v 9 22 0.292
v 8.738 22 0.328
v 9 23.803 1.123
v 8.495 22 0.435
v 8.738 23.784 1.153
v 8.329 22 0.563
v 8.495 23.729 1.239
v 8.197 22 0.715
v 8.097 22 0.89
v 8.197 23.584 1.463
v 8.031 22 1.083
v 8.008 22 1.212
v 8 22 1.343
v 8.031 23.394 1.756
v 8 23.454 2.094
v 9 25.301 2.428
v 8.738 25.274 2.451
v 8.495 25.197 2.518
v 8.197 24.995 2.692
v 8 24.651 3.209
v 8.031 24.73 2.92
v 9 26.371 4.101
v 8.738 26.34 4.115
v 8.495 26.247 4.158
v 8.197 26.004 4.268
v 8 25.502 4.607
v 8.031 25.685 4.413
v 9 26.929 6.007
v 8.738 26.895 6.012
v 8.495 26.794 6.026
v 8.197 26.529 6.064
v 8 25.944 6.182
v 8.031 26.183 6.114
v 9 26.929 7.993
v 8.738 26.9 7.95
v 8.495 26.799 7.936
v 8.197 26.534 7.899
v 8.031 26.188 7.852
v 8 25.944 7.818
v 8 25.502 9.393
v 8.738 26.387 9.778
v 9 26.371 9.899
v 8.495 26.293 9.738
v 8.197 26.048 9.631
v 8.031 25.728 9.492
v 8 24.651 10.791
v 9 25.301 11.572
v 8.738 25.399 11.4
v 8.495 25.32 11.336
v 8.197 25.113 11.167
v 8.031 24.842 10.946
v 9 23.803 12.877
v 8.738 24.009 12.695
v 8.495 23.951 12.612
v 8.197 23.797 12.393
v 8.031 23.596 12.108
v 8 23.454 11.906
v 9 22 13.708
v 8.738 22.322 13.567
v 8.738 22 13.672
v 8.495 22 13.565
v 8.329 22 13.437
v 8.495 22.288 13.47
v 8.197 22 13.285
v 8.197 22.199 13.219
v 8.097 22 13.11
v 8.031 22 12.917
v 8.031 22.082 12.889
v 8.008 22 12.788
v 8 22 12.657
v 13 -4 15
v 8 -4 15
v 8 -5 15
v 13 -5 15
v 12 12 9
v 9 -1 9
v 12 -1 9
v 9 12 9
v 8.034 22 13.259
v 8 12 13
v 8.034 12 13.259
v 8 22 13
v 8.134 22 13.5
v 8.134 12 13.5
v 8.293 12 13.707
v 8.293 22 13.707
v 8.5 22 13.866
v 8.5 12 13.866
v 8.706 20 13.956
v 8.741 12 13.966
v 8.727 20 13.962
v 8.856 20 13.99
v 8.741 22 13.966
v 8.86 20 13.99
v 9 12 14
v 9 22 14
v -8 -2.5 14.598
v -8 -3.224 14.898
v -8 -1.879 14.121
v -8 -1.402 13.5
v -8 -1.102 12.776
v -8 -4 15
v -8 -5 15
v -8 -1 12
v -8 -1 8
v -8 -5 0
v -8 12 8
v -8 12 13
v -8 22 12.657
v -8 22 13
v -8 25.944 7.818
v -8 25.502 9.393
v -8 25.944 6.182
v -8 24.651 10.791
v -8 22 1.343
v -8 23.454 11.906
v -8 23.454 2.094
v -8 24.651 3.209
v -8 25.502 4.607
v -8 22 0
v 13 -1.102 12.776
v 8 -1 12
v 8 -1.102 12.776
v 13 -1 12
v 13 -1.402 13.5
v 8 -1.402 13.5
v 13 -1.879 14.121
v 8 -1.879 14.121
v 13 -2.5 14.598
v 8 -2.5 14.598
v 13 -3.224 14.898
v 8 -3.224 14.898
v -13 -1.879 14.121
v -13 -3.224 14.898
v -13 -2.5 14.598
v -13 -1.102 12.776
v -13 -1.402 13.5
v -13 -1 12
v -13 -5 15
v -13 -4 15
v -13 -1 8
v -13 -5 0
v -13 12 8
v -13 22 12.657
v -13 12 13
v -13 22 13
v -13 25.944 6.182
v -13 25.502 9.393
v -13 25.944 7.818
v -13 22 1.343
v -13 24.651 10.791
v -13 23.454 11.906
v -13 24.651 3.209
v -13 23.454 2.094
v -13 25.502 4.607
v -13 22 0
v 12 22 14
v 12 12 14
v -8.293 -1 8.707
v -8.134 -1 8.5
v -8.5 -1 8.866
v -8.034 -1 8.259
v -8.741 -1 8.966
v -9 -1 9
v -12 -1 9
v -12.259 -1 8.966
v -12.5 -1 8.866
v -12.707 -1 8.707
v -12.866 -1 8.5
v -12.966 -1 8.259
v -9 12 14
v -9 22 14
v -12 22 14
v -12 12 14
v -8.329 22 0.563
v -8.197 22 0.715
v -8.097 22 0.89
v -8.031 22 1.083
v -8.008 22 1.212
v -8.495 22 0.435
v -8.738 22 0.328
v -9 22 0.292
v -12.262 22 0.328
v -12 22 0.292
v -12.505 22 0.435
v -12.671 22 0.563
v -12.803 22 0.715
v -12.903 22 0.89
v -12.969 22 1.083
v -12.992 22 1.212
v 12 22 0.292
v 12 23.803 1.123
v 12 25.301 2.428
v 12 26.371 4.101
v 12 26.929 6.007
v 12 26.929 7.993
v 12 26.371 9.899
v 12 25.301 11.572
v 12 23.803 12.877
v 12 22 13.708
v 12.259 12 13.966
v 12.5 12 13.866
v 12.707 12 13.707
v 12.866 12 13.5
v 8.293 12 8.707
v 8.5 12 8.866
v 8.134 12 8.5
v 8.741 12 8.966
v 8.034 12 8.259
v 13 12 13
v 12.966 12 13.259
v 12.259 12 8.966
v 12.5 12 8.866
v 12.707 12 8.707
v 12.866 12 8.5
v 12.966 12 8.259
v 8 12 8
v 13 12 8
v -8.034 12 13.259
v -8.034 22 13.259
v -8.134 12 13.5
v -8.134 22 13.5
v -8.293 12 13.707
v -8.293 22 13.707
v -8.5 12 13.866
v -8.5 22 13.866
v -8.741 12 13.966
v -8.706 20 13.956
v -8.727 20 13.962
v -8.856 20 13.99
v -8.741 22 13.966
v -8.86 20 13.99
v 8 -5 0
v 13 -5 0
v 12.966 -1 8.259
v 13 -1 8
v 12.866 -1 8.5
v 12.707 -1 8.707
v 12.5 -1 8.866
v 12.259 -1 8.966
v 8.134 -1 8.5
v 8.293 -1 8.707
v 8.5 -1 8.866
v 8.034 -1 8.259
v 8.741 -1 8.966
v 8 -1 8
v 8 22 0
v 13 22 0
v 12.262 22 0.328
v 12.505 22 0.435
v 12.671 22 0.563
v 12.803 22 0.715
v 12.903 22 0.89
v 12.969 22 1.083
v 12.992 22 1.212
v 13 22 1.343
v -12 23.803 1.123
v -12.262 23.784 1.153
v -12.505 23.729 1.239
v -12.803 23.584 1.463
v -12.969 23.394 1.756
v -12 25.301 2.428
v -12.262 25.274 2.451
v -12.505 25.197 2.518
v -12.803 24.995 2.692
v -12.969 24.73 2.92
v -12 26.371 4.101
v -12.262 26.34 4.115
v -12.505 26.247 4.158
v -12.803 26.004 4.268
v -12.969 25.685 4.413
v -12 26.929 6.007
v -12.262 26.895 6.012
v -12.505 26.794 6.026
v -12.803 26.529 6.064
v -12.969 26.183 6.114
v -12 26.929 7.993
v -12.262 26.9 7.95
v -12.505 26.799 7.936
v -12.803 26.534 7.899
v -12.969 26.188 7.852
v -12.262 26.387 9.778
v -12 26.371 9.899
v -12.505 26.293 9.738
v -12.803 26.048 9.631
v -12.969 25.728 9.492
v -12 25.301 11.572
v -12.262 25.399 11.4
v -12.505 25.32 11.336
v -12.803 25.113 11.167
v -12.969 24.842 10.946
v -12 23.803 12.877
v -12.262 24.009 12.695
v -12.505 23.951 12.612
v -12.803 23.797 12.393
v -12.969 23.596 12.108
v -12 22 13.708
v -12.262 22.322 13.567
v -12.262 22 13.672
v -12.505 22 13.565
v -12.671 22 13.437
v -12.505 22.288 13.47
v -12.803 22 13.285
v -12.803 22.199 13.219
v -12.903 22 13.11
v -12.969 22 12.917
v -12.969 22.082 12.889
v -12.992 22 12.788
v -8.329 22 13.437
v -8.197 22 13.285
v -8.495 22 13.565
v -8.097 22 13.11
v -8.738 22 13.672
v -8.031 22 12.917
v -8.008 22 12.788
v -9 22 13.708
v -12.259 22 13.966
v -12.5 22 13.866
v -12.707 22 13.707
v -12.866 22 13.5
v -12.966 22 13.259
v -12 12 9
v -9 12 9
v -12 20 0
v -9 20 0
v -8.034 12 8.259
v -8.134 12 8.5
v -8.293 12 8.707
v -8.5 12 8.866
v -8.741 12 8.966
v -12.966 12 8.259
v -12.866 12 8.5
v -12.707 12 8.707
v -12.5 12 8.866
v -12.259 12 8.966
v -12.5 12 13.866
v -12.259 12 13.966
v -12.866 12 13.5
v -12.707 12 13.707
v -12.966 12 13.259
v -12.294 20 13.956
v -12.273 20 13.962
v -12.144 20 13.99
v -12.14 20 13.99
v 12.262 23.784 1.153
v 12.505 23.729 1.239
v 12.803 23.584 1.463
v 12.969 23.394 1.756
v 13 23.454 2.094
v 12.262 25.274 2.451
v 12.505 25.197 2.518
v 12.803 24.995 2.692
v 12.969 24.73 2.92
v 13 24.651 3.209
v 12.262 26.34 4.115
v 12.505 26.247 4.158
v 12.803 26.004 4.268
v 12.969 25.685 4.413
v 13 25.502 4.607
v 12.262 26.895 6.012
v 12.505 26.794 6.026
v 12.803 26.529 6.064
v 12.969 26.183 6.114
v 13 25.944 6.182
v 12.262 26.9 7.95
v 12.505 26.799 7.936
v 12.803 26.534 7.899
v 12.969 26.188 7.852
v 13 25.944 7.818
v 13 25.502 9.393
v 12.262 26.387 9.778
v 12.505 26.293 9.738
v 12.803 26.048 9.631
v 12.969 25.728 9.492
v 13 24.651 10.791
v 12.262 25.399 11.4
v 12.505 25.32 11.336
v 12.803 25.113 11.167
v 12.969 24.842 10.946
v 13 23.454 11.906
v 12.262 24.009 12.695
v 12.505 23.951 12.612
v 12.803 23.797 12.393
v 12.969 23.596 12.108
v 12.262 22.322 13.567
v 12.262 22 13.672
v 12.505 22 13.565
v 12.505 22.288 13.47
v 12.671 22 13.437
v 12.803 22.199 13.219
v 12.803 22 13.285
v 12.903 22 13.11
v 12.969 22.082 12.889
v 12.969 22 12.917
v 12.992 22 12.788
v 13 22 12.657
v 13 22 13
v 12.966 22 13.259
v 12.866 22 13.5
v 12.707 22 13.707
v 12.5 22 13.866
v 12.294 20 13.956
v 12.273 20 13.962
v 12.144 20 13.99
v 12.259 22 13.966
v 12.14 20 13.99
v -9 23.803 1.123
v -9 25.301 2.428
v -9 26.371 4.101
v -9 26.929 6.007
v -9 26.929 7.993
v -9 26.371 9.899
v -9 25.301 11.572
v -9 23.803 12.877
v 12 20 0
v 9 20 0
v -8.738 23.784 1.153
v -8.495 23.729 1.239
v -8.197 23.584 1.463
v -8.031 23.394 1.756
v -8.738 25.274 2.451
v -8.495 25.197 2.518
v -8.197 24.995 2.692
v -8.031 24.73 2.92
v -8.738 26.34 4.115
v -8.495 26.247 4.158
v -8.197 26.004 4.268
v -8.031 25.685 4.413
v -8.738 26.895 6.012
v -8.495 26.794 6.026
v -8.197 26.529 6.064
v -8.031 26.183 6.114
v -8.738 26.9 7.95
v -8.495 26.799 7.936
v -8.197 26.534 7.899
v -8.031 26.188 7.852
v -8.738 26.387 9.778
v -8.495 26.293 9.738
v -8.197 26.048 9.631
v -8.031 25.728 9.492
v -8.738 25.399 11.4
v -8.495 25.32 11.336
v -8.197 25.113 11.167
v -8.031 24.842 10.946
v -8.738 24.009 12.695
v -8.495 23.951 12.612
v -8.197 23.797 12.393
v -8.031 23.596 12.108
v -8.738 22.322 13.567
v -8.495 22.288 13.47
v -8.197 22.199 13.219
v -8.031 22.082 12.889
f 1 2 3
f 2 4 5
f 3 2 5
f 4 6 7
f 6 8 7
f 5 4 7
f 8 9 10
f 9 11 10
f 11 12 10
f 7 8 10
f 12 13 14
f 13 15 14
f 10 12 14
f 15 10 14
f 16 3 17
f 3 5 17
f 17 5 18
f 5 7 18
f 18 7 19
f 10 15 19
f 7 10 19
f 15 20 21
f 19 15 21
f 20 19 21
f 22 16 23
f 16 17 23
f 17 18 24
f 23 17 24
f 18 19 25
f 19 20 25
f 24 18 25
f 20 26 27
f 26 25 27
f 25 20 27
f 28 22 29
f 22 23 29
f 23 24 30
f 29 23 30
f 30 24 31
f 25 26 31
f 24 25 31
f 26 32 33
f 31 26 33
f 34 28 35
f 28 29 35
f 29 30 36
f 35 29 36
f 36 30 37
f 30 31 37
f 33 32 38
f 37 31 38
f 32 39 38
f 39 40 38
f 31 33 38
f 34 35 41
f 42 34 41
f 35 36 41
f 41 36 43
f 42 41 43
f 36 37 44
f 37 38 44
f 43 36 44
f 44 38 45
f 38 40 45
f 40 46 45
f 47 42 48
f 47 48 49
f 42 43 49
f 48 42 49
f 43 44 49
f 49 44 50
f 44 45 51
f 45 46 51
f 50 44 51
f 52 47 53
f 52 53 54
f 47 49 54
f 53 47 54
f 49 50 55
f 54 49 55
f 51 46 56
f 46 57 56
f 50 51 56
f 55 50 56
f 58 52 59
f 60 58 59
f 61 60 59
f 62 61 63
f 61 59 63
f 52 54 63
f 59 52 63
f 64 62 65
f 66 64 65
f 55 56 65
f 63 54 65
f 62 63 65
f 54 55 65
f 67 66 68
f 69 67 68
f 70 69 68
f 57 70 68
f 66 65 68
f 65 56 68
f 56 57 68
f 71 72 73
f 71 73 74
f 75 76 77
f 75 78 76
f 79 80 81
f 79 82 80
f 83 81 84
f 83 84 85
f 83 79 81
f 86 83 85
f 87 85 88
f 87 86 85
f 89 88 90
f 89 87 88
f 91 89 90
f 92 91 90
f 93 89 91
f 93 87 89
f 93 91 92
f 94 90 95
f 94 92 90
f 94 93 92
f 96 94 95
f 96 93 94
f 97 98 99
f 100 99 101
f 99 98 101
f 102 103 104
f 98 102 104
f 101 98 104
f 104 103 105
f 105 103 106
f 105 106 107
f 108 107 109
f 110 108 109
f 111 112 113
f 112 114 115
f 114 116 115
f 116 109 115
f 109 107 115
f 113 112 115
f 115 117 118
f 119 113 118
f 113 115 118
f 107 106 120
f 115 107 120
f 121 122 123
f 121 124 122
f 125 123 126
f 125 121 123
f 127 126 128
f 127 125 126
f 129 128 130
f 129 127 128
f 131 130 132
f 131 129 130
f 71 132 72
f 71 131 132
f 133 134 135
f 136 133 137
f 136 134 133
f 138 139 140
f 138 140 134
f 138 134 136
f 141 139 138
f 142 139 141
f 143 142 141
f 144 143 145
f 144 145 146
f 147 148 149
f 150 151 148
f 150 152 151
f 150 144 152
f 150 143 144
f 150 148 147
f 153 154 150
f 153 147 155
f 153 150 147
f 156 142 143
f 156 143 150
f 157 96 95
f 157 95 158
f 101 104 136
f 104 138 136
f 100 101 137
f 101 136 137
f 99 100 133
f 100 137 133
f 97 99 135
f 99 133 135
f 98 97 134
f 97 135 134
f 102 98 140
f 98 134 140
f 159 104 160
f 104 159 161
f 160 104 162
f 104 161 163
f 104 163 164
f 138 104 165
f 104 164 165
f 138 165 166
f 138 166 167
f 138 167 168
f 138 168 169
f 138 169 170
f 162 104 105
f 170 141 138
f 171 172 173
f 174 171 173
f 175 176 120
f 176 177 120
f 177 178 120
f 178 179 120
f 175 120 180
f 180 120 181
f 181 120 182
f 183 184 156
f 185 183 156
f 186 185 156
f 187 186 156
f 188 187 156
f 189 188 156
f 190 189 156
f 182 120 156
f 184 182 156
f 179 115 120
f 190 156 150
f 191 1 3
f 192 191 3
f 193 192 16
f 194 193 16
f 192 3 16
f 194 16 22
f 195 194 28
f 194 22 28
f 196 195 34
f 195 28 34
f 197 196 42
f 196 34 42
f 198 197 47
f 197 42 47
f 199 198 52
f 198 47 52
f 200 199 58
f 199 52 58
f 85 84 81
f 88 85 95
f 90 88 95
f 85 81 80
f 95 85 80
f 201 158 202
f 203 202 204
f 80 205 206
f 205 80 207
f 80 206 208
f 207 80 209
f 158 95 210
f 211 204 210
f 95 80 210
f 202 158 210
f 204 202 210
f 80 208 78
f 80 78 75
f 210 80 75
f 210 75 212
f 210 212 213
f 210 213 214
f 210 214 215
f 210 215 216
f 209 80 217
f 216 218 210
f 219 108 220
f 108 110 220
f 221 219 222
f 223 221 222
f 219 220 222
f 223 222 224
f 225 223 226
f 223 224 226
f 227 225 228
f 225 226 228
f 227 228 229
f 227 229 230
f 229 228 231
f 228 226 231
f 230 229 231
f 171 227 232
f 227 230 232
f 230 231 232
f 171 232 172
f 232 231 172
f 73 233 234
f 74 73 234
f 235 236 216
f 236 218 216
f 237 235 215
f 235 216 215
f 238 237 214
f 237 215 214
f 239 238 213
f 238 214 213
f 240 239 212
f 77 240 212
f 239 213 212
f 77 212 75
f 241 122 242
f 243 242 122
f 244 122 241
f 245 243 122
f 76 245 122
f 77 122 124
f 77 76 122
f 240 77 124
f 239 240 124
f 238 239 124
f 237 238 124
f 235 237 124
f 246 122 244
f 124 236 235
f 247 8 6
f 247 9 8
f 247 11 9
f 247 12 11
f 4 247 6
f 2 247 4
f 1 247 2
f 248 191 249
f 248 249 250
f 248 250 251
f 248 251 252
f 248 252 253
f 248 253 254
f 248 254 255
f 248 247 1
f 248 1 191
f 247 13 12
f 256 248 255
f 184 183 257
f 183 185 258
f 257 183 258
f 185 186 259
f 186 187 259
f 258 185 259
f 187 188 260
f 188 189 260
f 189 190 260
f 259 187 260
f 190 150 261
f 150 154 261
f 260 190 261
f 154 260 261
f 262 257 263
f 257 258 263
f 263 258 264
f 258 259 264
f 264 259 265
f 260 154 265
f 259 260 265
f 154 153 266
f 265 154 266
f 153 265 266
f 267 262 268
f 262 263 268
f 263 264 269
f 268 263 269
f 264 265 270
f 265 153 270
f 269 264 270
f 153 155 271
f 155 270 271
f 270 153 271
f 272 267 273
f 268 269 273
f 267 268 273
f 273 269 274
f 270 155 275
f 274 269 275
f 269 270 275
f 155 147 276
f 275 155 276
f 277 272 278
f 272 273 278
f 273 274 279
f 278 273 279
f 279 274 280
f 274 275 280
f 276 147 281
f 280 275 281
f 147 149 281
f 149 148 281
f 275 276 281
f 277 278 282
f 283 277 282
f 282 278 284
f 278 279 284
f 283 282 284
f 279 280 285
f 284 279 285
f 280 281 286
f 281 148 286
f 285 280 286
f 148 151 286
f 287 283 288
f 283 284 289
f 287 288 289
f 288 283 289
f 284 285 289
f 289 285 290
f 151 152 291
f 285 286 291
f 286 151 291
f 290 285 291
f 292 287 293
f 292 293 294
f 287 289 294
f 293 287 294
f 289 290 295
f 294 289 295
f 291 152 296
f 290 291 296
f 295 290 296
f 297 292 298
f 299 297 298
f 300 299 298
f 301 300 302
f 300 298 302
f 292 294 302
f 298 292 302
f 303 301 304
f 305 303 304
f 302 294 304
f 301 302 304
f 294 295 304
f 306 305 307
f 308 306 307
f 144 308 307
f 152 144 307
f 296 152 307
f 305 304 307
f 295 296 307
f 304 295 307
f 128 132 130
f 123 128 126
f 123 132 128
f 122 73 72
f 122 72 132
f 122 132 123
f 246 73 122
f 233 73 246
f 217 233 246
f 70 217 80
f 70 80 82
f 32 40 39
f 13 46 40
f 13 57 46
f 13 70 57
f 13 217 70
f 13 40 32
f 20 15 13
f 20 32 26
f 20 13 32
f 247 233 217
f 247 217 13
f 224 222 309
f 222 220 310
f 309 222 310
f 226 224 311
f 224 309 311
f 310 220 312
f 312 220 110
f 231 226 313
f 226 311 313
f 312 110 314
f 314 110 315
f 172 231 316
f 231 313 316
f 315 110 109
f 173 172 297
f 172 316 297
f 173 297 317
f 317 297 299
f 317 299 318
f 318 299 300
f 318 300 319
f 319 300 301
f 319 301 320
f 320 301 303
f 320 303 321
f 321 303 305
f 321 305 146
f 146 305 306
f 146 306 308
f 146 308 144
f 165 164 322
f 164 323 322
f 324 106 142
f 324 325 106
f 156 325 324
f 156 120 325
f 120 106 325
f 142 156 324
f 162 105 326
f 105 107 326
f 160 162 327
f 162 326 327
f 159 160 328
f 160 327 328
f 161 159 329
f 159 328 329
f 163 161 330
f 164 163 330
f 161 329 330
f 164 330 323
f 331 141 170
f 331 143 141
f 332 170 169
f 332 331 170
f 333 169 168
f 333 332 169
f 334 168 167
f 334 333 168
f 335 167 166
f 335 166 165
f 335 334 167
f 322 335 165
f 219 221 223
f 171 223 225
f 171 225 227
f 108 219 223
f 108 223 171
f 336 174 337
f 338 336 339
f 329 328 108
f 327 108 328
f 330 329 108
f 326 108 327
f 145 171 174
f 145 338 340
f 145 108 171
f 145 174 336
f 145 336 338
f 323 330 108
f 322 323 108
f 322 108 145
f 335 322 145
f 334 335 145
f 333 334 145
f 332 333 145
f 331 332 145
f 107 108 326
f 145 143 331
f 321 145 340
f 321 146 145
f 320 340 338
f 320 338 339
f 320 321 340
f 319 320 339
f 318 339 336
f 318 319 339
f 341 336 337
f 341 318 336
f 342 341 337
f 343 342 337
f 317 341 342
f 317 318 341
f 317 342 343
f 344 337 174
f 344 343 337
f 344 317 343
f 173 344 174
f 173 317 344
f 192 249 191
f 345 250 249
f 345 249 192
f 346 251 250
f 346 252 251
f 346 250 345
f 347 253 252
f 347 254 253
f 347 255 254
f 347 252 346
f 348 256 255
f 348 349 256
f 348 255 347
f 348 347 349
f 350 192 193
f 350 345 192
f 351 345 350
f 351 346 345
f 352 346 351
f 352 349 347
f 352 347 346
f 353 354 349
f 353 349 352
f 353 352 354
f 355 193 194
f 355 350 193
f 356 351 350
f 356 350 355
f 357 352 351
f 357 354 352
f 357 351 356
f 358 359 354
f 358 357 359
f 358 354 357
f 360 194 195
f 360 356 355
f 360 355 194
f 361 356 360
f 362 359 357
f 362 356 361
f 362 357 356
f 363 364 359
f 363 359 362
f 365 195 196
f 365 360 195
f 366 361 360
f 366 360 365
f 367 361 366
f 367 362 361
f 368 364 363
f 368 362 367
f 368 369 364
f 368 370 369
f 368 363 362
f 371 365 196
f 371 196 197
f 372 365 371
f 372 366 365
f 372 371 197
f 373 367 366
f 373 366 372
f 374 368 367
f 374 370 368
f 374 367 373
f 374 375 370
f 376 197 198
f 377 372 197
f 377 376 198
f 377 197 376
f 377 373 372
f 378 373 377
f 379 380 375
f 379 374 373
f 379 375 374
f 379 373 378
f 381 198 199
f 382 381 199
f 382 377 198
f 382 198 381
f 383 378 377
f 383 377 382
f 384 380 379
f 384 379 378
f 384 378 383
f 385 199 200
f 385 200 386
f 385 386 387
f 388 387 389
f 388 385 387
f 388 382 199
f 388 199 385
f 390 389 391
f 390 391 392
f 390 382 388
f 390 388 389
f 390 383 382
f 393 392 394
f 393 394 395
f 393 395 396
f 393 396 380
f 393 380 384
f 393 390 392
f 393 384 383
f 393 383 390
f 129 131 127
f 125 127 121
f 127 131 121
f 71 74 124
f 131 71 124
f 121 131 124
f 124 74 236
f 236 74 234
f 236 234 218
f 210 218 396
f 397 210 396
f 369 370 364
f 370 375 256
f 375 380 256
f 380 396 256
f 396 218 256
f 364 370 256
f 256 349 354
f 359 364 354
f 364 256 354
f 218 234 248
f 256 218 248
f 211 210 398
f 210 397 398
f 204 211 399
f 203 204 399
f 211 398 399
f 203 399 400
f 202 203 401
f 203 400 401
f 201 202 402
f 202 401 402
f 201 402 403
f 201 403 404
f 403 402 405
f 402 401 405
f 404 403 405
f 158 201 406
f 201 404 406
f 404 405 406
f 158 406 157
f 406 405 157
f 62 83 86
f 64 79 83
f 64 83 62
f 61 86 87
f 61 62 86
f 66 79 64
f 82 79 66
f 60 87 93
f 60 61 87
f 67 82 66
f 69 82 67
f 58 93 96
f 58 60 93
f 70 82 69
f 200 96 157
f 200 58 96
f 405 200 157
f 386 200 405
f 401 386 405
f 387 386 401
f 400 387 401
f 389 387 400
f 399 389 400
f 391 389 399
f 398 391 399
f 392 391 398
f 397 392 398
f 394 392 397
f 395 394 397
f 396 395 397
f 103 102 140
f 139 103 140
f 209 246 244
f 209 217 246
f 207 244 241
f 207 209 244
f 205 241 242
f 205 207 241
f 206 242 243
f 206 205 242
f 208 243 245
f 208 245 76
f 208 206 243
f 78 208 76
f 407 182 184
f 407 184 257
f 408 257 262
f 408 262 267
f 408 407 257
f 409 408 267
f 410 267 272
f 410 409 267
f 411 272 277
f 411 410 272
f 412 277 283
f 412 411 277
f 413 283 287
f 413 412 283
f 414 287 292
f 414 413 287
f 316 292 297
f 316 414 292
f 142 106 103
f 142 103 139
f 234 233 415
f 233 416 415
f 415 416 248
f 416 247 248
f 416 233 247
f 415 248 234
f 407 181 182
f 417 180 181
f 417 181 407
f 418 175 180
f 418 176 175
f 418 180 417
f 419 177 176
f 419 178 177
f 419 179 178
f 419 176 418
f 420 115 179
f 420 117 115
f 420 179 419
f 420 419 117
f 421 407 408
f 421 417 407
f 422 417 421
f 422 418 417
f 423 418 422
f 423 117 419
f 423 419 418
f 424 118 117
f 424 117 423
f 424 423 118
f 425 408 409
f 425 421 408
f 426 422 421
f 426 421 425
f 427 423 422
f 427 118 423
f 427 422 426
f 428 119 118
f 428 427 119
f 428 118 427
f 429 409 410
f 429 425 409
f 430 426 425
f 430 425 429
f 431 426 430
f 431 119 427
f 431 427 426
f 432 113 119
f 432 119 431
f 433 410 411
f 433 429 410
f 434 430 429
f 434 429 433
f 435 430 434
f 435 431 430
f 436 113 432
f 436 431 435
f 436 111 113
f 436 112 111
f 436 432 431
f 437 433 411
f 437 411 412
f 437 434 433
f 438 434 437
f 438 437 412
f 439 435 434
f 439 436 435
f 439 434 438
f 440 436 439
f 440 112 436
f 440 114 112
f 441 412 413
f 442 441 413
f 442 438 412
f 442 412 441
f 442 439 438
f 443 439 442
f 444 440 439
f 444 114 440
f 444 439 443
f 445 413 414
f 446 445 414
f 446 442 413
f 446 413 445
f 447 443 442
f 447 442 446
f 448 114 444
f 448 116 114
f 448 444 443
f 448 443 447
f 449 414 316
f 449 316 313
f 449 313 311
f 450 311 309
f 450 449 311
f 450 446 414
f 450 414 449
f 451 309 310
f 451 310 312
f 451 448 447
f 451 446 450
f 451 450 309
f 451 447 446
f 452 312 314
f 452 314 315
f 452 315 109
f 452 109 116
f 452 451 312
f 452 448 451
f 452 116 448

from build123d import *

# Parameters (mm, degrees)
BOX004_W          = 5
BOX004_H          = 13
BOX004_DEPTH      = 9
FILLET007_R       = 1
CYLINDER007_R     = 7
CYLINDER007_DEPTH = 5
FILLET008_R       = 1
BOX002_W          = 5
BOX002_H          = 10
BOX002_DEPTH      = 14
FILLET009_R       = 1
BOX005_W          = 5
BOX005_H          = 4
BOX005_DEPTH      = 15
FILLET003_R       = 3


with BuildPart() as fillet007:
    # Box004 → Box004 (new body)
    with BuildSketch(Plane(origin=(8, -1, 0), x_dir=(1, 0, 0), z_dir=(0, 0, 1))):
        with Locations((2.5, 6.5)):
            Rectangle(BOX004_W, BOX004_H)
    extrude(amount=BOX004_DEPTH)

    # Fillet007
    fillet007_edges = [fillet007.edges().sort_by_distance(p)[0] for p in [
        (8, 5.5, 9),
        (13, 5.5, 9),
    ]]
    fillet(fillet007_edges, radius=FILLET007_R)


with BuildPart() as fillet008:
    # Cylinder007 → Cylinder007 (new body)
    with BuildSketch(Plane(origin=(8, 20, 7), x_dir=(0, 0, -1), z_dir=(1, 0, 0))):
        Circle(CYLINDER007_R)
    extrude(amount=CYLINDER007_DEPTH)

    # Fillet008
    fillet008_edges = [fillet008.edges().sort_by_distance(p)[0] for p in [
        (13, 20, 14),
        (8, 20, 14),
    ]]
    fillet(fillet008_edges, radius=FILLET008_R)


with BuildPart() as fillet009:
    # Box002 → Box002 (new body)
    with BuildSketch(Plane(origin=(8, 12, 0), x_dir=(1, 0, 0), z_dir=(0, 0, 1))):
        with Locations((2.5, 5)):
            Rectangle(BOX002_W, BOX002_H)
    extrude(amount=BOX002_DEPTH)

    # Fillet009
    fillet009_edges = [fillet009.edges().sort_by_distance(p)[0] for p in [
        (8, 17, 14),
        (13, 17, 14),
    ]]
    fillet(fillet009_edges, radius=FILLET009_R)


with BuildPart() as fusion002:
    # Box005 → Box005 (new body)
    with BuildSketch(Plane(origin=(8, -5, 0), x_dir=(1, 0, 0), z_dir=(0, 0, 1))):
        with Locations((2.5, 2)):
            Rectangle(BOX005_W, BOX005_H)
    extrude(amount=BOX005_DEPTH)

    # Fillet003
    fillet003_edges = [fusion002.edges().sort_by_distance(p)[0] for p in [
        (10.5, -1, 15),
    ]]
    fillet(fillet003_edges, radius=FILLET003_R)

    # Fusion002: union Fillet007, Fillet008, Fillet009
    add(fillet007.part)
    add(fillet008.part)
    add(fillet009.part)


with BuildPart() as back_legs:
    # Part__Mirroring001: instance of Fusion002
    add(fusion002.part.mirror(Plane(origin=(0, 0, 0), x_dir=(0, -1, 0), z_dir=(1, 0, 0))))

    # Fusion004: union Fusion002
    add(fusion002.part)


solid = back_legs.part
